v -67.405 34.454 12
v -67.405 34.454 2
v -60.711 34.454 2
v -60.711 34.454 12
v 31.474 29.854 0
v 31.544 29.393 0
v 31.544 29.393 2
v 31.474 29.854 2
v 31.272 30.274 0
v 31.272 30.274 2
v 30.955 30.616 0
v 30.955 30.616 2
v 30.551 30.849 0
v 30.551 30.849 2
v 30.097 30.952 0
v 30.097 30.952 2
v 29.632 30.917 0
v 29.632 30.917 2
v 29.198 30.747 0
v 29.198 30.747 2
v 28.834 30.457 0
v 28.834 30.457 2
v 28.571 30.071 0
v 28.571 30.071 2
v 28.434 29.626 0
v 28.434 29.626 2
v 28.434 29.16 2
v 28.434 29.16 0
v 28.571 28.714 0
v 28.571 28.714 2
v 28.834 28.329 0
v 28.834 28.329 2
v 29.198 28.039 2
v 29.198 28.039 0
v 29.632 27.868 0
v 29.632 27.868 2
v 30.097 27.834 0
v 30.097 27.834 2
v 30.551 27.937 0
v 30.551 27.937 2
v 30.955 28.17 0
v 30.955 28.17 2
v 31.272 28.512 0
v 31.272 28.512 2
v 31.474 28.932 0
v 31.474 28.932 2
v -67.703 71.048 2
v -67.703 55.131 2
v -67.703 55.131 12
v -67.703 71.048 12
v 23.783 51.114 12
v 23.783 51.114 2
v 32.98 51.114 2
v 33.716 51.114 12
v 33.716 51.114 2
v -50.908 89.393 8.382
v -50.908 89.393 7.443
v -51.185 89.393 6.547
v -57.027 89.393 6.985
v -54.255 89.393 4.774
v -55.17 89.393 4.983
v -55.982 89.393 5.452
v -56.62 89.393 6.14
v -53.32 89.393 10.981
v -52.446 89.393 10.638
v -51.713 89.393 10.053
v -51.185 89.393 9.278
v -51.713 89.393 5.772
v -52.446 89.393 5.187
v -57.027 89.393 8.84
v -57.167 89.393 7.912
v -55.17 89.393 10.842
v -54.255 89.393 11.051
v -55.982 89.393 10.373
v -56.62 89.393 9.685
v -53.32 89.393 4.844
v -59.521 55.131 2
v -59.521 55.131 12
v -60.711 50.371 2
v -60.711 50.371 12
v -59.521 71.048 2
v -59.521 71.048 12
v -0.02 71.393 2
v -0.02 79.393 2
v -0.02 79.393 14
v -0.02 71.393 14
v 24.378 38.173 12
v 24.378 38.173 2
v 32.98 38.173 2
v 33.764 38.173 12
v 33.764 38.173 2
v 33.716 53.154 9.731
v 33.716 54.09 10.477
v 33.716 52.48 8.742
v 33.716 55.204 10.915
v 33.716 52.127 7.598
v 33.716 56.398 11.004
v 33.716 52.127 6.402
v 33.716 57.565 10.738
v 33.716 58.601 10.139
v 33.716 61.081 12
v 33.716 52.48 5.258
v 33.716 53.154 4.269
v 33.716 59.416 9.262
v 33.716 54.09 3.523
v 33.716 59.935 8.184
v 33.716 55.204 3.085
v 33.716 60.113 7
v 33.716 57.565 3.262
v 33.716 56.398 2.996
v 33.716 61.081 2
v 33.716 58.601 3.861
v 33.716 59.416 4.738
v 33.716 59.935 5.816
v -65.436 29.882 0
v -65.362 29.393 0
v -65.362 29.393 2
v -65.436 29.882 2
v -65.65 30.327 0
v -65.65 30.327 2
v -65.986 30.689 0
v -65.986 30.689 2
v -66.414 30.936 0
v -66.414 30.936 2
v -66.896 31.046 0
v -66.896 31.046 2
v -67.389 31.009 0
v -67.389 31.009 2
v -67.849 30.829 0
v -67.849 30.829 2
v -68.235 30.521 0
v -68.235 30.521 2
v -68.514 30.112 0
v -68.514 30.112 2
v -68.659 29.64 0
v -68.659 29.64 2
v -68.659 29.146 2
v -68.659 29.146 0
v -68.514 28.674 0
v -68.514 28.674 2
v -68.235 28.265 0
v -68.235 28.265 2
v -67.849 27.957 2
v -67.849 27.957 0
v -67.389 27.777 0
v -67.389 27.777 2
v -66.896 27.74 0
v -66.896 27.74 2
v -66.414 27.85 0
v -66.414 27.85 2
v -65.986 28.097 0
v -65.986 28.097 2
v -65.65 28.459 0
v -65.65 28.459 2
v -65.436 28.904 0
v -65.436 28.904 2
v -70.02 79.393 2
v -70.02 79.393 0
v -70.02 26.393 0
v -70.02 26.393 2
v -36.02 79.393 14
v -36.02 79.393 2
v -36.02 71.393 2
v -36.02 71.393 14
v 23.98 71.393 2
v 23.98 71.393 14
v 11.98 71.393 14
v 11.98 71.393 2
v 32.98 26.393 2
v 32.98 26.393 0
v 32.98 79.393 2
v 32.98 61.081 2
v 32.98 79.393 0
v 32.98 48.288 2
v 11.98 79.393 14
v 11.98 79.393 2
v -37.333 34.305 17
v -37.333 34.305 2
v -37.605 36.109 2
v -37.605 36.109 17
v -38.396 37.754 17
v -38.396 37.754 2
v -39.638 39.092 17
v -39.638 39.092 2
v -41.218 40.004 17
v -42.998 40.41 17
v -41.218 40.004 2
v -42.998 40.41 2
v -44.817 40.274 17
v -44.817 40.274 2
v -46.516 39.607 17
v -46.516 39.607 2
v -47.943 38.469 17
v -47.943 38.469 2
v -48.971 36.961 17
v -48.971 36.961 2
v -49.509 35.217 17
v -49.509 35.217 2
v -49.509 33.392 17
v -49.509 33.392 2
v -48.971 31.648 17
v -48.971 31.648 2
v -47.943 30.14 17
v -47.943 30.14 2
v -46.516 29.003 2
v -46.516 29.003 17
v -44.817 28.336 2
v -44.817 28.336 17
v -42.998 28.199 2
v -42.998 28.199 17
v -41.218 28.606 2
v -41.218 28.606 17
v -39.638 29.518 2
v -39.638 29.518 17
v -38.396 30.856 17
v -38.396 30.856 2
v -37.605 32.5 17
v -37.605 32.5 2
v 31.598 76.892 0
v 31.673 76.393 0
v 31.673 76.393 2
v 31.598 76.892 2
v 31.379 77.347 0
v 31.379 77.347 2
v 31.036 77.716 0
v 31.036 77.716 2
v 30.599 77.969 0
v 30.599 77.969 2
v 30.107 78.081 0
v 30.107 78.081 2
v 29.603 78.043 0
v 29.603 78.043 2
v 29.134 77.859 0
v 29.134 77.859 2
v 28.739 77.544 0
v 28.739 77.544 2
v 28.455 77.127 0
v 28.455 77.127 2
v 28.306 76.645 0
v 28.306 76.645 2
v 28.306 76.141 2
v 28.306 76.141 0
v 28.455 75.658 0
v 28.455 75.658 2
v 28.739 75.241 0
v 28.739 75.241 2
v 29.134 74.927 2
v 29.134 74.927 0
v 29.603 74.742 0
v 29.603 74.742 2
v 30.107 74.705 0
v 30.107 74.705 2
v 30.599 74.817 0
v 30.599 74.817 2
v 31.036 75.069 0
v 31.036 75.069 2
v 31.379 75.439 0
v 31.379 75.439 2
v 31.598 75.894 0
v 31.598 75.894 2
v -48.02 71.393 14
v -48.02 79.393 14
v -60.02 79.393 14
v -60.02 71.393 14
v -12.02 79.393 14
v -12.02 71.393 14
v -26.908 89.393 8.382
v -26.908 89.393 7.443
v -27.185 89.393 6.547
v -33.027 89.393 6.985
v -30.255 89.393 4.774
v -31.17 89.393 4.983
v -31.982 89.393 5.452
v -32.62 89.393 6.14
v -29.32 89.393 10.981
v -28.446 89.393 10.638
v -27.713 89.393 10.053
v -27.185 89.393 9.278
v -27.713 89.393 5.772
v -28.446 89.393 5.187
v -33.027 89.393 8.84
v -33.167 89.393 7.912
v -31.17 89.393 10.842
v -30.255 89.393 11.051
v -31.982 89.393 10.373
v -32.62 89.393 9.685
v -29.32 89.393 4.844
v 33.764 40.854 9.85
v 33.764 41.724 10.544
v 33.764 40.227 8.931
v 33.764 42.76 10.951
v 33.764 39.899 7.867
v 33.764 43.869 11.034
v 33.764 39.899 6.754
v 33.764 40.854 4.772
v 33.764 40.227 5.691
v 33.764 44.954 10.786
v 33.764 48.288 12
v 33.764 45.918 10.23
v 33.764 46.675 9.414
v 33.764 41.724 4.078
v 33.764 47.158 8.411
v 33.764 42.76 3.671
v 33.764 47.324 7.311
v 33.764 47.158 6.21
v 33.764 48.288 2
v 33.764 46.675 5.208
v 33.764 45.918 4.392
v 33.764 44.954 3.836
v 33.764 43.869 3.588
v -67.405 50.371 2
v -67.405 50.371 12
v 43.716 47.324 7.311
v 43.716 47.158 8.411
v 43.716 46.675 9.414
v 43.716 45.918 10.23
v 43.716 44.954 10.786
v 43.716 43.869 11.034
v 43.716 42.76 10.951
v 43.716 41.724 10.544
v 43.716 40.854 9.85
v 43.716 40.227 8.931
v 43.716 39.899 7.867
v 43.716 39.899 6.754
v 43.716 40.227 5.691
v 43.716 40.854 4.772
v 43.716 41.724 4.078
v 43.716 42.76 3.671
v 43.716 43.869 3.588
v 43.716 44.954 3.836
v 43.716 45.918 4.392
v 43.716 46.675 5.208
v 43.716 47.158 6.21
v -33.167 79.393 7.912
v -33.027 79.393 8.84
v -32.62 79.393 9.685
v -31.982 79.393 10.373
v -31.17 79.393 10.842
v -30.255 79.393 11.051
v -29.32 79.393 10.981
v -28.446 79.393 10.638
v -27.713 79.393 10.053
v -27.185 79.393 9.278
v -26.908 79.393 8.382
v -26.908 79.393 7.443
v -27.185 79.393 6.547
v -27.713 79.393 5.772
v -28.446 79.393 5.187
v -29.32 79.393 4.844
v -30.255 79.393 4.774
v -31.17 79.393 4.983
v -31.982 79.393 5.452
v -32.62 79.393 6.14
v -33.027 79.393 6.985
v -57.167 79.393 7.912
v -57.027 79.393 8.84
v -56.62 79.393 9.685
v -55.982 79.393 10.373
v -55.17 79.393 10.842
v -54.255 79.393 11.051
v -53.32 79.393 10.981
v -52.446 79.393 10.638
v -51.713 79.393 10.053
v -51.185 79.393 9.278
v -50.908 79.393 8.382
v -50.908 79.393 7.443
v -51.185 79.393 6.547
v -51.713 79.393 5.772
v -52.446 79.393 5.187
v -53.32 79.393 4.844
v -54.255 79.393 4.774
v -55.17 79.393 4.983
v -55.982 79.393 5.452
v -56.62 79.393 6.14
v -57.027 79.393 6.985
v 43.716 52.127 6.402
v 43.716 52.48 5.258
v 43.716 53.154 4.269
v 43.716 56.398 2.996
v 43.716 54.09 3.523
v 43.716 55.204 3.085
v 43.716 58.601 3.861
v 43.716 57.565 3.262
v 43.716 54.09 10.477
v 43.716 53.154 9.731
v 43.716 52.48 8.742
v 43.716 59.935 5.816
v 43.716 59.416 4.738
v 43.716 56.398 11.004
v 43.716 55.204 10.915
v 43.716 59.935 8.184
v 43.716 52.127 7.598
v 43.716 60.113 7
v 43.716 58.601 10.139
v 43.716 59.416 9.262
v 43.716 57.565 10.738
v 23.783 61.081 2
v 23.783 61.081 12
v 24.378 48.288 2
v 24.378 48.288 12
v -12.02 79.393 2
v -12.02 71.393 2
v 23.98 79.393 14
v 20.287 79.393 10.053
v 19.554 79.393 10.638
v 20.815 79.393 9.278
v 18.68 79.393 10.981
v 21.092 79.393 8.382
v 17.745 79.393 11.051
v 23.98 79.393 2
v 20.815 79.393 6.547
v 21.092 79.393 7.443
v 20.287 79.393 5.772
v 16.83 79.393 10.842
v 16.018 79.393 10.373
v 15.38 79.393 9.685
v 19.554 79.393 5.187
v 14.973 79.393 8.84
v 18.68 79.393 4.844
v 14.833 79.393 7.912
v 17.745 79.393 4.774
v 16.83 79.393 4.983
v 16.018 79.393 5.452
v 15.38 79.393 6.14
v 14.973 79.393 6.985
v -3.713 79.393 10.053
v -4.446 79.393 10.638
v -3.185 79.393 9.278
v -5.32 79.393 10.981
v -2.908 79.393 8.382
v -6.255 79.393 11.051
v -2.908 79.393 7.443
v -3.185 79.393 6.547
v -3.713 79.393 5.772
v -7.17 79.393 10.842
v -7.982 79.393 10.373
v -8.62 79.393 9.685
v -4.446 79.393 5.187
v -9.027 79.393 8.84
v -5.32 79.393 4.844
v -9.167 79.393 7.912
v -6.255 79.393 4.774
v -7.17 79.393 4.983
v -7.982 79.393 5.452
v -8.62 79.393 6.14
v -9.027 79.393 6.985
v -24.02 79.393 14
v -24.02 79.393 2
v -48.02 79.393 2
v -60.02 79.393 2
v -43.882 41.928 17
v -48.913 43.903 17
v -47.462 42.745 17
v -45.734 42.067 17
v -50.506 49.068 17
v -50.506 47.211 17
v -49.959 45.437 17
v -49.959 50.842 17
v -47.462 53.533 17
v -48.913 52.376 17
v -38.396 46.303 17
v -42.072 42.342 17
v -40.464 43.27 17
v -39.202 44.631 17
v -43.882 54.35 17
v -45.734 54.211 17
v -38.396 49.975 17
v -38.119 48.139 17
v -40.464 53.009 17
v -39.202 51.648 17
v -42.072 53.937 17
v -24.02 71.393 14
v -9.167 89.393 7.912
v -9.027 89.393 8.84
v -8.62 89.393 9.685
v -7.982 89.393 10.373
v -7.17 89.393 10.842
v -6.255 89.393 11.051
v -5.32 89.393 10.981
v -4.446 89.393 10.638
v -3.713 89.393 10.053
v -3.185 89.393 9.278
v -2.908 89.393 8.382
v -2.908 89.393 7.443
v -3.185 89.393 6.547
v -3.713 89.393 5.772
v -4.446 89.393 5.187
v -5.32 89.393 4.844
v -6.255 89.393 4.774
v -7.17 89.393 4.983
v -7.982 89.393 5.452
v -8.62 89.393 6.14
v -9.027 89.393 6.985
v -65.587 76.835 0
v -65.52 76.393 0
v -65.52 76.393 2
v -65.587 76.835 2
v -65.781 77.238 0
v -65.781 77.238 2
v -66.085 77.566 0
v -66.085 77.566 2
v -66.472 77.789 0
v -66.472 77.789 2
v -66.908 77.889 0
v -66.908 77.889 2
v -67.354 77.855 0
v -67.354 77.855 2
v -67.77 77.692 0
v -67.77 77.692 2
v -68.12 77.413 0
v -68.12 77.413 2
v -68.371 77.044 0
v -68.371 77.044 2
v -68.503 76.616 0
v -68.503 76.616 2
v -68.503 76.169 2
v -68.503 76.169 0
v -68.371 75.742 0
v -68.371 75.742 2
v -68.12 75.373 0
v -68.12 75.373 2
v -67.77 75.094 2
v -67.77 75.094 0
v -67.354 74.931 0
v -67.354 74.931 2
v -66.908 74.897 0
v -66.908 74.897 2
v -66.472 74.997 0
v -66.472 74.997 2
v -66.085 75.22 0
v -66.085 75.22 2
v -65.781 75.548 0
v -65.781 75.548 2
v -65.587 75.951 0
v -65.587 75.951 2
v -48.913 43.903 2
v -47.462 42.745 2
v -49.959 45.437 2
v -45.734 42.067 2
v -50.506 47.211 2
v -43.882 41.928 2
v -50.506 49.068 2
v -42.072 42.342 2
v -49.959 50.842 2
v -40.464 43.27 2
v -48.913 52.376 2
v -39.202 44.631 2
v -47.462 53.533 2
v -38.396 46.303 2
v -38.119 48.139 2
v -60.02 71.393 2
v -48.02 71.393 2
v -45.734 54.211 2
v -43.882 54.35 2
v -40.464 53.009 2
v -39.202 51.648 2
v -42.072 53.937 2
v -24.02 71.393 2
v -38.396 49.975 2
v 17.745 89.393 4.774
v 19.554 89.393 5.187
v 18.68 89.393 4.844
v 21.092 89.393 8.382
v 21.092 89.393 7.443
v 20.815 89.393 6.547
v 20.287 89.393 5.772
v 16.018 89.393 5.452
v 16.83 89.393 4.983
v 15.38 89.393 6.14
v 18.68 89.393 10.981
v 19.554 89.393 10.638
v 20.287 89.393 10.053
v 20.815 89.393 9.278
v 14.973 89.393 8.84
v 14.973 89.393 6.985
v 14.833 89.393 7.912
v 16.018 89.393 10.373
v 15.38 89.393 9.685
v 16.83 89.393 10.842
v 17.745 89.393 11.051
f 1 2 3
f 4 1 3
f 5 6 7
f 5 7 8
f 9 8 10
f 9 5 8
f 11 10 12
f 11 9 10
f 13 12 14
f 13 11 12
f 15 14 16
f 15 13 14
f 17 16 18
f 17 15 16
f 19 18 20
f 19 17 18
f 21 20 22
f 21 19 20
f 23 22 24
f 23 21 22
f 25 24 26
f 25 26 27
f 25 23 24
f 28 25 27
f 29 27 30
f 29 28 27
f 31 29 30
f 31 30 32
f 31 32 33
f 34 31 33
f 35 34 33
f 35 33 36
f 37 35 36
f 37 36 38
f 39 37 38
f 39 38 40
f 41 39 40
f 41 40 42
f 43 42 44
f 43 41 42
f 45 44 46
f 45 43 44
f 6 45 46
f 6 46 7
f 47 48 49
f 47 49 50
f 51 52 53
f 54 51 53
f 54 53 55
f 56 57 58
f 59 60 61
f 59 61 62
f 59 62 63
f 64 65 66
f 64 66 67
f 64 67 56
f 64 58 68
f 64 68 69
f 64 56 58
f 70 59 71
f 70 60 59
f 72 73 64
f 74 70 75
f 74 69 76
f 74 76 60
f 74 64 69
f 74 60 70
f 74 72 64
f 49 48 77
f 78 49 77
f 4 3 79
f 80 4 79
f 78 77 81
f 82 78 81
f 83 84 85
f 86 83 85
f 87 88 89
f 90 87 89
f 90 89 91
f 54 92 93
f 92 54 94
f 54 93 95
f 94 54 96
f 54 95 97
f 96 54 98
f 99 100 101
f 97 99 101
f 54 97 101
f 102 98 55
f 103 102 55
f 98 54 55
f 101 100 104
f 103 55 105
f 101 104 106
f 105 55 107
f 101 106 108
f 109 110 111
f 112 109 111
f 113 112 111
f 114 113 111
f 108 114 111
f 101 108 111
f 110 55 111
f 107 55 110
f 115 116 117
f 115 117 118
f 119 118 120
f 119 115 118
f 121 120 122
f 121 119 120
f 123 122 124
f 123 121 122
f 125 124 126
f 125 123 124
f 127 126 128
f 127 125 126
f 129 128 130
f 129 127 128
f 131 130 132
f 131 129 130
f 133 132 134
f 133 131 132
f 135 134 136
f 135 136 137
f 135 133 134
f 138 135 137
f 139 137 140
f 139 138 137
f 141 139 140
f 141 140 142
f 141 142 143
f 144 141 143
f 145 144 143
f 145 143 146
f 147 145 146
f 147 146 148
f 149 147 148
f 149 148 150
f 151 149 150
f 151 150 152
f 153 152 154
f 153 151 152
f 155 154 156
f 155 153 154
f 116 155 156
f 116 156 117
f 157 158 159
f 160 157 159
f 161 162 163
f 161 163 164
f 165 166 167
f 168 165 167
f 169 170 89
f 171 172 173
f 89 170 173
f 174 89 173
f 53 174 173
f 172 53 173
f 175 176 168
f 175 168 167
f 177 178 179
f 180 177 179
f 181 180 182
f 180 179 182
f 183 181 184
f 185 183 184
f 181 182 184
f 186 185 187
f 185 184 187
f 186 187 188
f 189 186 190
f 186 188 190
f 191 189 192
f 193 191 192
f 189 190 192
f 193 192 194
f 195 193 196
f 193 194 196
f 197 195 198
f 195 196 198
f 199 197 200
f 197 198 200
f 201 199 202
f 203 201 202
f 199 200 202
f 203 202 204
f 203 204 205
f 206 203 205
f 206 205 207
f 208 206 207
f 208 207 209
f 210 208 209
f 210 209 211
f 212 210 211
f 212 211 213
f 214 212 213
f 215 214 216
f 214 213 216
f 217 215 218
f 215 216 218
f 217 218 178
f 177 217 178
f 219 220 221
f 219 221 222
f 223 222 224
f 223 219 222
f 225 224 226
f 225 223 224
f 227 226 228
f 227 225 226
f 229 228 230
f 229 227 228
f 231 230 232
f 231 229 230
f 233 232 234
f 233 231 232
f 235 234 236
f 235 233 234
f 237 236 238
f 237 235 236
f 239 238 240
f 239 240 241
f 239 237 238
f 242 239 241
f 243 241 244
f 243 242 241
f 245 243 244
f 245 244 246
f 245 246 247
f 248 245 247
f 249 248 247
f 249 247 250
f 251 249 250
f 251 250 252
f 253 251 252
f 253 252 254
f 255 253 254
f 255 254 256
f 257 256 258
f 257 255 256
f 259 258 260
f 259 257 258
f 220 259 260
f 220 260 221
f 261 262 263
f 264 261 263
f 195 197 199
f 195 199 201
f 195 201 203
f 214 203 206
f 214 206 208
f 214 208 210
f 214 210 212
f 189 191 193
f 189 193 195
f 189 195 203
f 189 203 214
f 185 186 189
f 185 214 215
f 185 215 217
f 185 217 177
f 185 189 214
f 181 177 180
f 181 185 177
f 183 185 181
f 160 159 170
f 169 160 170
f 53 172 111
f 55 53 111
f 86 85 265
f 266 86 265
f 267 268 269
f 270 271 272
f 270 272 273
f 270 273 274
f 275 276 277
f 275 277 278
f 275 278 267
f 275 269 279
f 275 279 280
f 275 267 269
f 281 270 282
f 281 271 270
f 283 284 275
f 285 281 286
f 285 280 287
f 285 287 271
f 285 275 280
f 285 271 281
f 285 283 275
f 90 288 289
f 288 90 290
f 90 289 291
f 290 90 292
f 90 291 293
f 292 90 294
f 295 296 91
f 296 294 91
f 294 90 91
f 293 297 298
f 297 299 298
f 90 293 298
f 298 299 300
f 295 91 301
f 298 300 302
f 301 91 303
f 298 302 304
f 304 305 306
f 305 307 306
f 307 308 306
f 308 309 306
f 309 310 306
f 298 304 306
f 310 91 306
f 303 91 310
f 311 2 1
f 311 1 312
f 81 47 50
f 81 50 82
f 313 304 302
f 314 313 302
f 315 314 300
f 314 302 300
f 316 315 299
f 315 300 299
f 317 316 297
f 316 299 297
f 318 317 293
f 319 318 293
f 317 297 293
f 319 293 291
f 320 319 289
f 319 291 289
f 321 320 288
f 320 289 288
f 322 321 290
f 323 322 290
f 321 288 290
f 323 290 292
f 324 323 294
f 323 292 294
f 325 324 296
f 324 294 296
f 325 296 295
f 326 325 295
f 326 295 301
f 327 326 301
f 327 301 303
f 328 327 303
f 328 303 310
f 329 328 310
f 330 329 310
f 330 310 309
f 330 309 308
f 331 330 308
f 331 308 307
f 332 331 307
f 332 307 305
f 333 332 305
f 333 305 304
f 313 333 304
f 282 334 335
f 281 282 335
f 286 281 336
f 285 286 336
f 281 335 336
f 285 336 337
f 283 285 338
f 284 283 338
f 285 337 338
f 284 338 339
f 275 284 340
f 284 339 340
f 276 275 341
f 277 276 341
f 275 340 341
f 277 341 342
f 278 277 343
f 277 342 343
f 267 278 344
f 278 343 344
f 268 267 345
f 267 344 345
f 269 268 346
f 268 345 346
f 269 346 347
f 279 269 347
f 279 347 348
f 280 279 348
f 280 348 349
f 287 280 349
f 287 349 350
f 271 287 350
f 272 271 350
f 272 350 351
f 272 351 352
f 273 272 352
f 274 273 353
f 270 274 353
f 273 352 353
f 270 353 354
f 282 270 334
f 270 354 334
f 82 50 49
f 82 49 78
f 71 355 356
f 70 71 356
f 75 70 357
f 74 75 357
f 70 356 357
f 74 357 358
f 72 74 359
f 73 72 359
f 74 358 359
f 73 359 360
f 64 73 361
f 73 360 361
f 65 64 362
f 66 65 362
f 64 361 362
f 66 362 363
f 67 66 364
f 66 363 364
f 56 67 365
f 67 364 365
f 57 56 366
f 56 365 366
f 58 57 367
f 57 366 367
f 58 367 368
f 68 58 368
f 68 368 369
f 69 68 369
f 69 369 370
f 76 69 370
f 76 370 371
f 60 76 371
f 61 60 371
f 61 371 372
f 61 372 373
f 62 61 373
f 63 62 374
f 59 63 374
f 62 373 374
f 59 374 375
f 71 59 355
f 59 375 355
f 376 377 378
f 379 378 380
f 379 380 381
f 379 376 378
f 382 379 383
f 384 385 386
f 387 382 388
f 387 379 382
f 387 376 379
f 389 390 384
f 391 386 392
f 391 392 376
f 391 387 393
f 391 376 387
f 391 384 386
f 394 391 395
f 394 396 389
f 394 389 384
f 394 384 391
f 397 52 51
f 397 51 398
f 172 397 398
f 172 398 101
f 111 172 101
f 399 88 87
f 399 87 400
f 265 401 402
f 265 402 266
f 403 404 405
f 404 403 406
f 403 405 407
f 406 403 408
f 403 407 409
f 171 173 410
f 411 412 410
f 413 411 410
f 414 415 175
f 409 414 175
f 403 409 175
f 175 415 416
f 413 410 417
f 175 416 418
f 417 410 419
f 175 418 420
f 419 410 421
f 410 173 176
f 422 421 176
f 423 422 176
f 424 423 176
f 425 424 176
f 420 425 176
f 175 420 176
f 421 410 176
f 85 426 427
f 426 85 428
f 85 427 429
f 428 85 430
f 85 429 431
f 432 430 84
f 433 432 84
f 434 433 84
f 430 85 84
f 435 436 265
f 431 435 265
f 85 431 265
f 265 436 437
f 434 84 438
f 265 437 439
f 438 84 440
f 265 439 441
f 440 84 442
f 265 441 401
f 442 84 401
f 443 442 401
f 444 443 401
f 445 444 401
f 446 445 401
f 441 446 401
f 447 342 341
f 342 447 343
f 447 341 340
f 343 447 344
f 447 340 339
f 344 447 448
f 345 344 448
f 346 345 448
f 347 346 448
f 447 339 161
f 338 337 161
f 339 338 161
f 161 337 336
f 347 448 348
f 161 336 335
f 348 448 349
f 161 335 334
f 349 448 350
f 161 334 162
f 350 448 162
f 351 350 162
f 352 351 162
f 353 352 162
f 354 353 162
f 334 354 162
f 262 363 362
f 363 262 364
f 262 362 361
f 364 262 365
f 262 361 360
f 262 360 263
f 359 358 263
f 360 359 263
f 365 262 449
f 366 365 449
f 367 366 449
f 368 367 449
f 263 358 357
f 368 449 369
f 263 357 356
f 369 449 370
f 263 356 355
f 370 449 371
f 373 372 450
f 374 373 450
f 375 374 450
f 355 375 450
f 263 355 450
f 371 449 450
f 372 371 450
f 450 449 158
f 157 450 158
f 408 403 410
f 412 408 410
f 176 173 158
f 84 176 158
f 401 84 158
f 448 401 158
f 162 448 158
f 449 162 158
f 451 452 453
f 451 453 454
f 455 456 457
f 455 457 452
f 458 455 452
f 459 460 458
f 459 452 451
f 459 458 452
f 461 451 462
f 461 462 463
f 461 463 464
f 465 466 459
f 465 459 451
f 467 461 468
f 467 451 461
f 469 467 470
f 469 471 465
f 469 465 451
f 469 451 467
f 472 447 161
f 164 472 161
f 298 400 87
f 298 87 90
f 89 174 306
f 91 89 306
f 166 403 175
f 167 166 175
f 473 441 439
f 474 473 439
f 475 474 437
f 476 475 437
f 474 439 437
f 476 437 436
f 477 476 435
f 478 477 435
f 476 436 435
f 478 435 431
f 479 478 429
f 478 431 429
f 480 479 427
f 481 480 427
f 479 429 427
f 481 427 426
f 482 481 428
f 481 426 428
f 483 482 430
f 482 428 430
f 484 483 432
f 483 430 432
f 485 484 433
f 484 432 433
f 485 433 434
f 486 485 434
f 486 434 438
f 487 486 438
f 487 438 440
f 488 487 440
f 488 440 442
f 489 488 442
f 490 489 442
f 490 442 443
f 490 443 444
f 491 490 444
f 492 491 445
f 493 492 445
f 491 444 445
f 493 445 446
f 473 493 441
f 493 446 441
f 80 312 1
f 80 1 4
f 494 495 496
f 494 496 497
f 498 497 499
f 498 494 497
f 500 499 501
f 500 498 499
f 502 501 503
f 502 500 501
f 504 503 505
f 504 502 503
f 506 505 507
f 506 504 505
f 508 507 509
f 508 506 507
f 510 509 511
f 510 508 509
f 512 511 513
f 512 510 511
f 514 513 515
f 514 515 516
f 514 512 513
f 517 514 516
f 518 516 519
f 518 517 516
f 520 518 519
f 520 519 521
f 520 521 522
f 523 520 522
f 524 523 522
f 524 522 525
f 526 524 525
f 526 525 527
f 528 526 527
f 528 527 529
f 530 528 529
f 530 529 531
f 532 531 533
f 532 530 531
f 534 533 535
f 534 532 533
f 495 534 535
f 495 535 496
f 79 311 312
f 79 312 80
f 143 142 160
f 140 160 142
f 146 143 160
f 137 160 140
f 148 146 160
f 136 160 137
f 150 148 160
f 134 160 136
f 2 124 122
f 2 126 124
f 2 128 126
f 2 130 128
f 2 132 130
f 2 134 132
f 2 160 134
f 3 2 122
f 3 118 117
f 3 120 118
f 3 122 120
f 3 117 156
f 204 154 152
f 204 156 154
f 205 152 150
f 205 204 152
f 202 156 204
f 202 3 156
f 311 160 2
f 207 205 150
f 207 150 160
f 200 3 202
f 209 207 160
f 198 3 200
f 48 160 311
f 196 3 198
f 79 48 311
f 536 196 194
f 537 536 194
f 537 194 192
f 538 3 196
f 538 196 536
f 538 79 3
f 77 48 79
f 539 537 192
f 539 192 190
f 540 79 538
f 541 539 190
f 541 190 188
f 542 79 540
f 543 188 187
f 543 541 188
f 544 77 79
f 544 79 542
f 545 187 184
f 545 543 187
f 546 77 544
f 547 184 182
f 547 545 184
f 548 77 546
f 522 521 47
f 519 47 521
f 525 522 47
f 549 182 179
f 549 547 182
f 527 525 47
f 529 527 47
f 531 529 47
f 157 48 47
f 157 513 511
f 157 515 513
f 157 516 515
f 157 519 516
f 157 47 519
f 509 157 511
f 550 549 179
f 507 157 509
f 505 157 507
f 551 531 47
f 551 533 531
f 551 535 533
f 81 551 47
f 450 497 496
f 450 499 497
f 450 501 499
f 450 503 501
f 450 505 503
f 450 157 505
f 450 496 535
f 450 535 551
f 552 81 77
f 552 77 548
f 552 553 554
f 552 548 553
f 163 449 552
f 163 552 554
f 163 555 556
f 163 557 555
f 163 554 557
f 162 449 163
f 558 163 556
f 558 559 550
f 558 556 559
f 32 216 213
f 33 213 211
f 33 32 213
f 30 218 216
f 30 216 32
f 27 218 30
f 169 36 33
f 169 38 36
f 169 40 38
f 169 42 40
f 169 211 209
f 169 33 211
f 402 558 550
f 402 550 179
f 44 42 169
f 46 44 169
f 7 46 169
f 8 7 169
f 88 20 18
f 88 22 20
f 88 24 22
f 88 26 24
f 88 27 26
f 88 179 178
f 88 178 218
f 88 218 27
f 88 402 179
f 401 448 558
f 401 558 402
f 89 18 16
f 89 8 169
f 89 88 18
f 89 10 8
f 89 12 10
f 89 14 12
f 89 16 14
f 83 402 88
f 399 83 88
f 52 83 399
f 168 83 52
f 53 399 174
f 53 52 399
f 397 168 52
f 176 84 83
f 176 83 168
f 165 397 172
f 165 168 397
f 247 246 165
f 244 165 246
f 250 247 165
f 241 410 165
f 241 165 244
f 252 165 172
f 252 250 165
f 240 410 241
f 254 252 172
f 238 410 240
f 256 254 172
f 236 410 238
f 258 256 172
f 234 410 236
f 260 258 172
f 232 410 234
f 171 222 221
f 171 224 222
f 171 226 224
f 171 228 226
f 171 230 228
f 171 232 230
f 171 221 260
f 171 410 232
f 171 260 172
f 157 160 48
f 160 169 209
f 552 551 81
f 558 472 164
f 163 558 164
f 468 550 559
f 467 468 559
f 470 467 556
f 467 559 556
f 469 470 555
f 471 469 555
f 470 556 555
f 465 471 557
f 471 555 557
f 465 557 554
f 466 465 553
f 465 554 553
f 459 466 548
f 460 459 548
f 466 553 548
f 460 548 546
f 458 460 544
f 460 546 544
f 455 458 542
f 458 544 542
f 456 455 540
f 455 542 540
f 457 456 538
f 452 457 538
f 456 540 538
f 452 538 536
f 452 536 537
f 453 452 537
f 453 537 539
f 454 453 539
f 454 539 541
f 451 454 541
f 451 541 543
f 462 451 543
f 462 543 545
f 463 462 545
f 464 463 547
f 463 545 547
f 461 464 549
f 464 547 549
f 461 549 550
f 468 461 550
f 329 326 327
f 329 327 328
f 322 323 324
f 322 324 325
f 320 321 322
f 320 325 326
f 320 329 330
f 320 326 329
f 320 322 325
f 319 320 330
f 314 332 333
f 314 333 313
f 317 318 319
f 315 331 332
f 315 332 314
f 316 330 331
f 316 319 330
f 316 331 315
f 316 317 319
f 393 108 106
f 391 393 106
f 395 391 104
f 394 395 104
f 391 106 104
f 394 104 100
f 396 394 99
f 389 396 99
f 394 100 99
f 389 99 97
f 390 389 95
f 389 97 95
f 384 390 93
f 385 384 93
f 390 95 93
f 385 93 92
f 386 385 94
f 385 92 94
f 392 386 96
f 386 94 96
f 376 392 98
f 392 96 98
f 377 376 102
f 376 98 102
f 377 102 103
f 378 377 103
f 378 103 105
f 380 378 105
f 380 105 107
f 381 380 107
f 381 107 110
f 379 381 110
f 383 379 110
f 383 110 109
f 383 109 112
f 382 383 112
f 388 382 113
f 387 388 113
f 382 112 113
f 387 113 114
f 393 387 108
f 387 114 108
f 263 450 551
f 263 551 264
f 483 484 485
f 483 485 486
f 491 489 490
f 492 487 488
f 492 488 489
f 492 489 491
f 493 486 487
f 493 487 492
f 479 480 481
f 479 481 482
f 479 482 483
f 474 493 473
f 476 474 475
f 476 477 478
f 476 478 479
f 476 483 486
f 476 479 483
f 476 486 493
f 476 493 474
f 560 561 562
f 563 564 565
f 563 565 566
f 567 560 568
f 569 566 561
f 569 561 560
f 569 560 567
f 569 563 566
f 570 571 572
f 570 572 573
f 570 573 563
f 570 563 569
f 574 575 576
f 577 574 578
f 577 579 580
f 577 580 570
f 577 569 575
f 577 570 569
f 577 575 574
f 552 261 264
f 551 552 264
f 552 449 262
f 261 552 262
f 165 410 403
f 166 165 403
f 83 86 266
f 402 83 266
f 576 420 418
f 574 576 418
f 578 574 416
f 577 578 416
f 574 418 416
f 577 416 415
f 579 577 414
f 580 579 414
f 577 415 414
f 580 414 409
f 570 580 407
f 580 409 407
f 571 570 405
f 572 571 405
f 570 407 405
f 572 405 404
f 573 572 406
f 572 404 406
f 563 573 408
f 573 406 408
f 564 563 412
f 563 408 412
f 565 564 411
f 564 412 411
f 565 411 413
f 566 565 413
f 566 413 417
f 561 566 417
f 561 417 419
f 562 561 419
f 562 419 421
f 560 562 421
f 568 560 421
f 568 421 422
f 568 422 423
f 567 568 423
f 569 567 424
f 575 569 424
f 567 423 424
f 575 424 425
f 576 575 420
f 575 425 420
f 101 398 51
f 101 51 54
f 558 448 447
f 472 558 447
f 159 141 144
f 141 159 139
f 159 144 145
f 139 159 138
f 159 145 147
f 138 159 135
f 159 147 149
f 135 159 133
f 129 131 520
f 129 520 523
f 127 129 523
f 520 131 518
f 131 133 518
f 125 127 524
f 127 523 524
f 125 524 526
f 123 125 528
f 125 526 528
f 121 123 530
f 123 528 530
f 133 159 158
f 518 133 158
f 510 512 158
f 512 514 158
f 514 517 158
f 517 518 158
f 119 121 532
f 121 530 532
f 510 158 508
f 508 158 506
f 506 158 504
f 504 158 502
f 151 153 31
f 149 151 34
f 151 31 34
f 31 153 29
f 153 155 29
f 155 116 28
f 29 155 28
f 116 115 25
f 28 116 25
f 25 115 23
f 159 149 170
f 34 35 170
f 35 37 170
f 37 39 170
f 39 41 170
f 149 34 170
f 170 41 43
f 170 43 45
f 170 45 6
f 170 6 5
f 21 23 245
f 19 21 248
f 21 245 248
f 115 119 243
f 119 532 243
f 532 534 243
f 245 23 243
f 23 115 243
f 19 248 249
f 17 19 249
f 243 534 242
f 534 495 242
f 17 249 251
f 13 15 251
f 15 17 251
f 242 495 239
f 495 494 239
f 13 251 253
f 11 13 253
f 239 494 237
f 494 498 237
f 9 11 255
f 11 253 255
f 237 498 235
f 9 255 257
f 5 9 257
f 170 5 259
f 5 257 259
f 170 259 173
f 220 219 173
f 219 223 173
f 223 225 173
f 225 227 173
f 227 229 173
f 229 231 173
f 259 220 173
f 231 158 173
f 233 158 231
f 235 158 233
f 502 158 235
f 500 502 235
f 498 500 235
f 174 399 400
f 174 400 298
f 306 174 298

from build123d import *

# Parameters (mm, degrees)
F0_R      = 1.657861898
F0_R_2    = 1.5637435582
F0_R_3    = 1.5
F0_R_4    = 1.6928931088
F1_DEPTH  = 2
F2_W      = 12
F2_H      = 12
F3_DEPTH  = 8
F4_R      = 3.1469960725
F5_DEPTH  = 10
F6_W      = 8.1816576421
F6_H      = 15.9170441329
F6_W_2    = 6.694085896
F6_H_2    = 15.9170404077
F6_W_3    = 9.9330767989
F6_H_3    = 9.9667422473
F6_W_4    = 9.3853771687
F6_H_4    = 10.1155005395
F7_DEPTH  = 10
F8_R      = 6.2283008091
F8_R_2    = 6.1225151743
F9_DEPTH  = 15
F10_R     = 4.0154432522
F10_R_2   = 3.7333835988
F11_DEPTH = 10


with BuildPart() as f1:
    # F0 (on Top) → F1 (new body)
    with BuildSketch(Plane.XY):
        Polygon((-70.0199790299, 79.3929218054), (-70.0199790299, 26.3929218054), (32.9800209701, 26.3929218054), (32.9800209701, 79.3929218054), (17.9800209701, 79.3929218054), align=None)
        with Locations((-67.0199790299, 29.3929218054)):
            Circle(F0_R, mode=Mode.SUBTRACT)
        with Locations((29.9800209701, 29.3929218054)):
            Circle(F0_R_2, mode=Mode.SUBTRACT)
        with Locations((-67.0199790299, 76.3929218054)):
            Circle(F0_R_3, mode=Mode.SUBTRACT)
        with Locations((29.9800209701, 76.3929218054)):
            Circle(F0_R_4, mode=Mode.SUBTRACT)
    extrude(amount=F1_DEPTH)

    # F2 (on face) → F3 (join)
    with BuildSketch(Plane(origin=(0, 79.3929218054, 0), x_dir=(-1, 0, 0), z_dir=(0, 1, 0))):
        with Locations((54.0199790299, 8)):
            Rectangle(F2_W, F2_H)
        with Locations((30.0199790299, 8)):
            Rectangle(F2_W, F2_H)
        with Locations((6.0199790299, 8)):
            Rectangle(F2_W, F2_H)
        with Locations((-17.9800209701, 8)):
            Rectangle(F2_W, F2_H)
    extrude(amount=-F3_DEPTH)

    # F4 (on face) → F5 (join)
    with BuildSketch(Plane(origin=(0, 79.3929218054, 0), x_dir=(-1, 0, 0), z_dir=(0, 1, 0))):
        with Locations((-17.9800209701, 7.9124979675)):
            Circle(F4_R)
        with Locations((6.0199790299, 7.9124979675)):
            Circle(F4_R)
        with Locations((30.0199790299, 7.9124979675)):
            Circle(F4_R)
        with Locations((54.0199790299, 7.9124979675)):
            Circle(F4_R)
    extrude(amount=F5_DEPTH)

    # F6 (on face) → F7 (join)
    with BuildSketch(Plane.XY.offset(2)):
        with Locations((-63.6116955429, 63.0893874913)):
            Rectangle(F6_W, F6_H)
        with Locations((-64.0579722822, 42.412109673)):
            Rectangle(F6_W_2, F6_H_2)
        with Locations((28.7498049438, 56.0977887362)):
            Rectangle(F6_W_3, F6_H_3)
        with Locations((29.0709845722, 43.2302746922)):
            Rectangle(F6_W_4, F6_H_4)
    extrude(amount=F7_DEPTH)

    # F8 (on face) → F9 (join)
    with BuildSketch(Plane.XY.offset(2)):
        with Locations((-44.3476177752, 48.1392666698)):
            Circle(F8_R)
        with Locations((-43.4550717473, 34.304831177)):
            Circle(F8_R_2)
    extrude(amount=F9_DEPTH)

    # F10 (on face) → F11 (join)
    with BuildSketch(Plane.YZ.offset(33.7163433433)):
        with Locations((56.0977887362, 7)):
            Circle(F10_R)
        with Locations((43.5904636979, 7.3108654469)):
            Circle(F10_R_2)
    extrude(amount=F11_DEPTH)


solid = f1.part
